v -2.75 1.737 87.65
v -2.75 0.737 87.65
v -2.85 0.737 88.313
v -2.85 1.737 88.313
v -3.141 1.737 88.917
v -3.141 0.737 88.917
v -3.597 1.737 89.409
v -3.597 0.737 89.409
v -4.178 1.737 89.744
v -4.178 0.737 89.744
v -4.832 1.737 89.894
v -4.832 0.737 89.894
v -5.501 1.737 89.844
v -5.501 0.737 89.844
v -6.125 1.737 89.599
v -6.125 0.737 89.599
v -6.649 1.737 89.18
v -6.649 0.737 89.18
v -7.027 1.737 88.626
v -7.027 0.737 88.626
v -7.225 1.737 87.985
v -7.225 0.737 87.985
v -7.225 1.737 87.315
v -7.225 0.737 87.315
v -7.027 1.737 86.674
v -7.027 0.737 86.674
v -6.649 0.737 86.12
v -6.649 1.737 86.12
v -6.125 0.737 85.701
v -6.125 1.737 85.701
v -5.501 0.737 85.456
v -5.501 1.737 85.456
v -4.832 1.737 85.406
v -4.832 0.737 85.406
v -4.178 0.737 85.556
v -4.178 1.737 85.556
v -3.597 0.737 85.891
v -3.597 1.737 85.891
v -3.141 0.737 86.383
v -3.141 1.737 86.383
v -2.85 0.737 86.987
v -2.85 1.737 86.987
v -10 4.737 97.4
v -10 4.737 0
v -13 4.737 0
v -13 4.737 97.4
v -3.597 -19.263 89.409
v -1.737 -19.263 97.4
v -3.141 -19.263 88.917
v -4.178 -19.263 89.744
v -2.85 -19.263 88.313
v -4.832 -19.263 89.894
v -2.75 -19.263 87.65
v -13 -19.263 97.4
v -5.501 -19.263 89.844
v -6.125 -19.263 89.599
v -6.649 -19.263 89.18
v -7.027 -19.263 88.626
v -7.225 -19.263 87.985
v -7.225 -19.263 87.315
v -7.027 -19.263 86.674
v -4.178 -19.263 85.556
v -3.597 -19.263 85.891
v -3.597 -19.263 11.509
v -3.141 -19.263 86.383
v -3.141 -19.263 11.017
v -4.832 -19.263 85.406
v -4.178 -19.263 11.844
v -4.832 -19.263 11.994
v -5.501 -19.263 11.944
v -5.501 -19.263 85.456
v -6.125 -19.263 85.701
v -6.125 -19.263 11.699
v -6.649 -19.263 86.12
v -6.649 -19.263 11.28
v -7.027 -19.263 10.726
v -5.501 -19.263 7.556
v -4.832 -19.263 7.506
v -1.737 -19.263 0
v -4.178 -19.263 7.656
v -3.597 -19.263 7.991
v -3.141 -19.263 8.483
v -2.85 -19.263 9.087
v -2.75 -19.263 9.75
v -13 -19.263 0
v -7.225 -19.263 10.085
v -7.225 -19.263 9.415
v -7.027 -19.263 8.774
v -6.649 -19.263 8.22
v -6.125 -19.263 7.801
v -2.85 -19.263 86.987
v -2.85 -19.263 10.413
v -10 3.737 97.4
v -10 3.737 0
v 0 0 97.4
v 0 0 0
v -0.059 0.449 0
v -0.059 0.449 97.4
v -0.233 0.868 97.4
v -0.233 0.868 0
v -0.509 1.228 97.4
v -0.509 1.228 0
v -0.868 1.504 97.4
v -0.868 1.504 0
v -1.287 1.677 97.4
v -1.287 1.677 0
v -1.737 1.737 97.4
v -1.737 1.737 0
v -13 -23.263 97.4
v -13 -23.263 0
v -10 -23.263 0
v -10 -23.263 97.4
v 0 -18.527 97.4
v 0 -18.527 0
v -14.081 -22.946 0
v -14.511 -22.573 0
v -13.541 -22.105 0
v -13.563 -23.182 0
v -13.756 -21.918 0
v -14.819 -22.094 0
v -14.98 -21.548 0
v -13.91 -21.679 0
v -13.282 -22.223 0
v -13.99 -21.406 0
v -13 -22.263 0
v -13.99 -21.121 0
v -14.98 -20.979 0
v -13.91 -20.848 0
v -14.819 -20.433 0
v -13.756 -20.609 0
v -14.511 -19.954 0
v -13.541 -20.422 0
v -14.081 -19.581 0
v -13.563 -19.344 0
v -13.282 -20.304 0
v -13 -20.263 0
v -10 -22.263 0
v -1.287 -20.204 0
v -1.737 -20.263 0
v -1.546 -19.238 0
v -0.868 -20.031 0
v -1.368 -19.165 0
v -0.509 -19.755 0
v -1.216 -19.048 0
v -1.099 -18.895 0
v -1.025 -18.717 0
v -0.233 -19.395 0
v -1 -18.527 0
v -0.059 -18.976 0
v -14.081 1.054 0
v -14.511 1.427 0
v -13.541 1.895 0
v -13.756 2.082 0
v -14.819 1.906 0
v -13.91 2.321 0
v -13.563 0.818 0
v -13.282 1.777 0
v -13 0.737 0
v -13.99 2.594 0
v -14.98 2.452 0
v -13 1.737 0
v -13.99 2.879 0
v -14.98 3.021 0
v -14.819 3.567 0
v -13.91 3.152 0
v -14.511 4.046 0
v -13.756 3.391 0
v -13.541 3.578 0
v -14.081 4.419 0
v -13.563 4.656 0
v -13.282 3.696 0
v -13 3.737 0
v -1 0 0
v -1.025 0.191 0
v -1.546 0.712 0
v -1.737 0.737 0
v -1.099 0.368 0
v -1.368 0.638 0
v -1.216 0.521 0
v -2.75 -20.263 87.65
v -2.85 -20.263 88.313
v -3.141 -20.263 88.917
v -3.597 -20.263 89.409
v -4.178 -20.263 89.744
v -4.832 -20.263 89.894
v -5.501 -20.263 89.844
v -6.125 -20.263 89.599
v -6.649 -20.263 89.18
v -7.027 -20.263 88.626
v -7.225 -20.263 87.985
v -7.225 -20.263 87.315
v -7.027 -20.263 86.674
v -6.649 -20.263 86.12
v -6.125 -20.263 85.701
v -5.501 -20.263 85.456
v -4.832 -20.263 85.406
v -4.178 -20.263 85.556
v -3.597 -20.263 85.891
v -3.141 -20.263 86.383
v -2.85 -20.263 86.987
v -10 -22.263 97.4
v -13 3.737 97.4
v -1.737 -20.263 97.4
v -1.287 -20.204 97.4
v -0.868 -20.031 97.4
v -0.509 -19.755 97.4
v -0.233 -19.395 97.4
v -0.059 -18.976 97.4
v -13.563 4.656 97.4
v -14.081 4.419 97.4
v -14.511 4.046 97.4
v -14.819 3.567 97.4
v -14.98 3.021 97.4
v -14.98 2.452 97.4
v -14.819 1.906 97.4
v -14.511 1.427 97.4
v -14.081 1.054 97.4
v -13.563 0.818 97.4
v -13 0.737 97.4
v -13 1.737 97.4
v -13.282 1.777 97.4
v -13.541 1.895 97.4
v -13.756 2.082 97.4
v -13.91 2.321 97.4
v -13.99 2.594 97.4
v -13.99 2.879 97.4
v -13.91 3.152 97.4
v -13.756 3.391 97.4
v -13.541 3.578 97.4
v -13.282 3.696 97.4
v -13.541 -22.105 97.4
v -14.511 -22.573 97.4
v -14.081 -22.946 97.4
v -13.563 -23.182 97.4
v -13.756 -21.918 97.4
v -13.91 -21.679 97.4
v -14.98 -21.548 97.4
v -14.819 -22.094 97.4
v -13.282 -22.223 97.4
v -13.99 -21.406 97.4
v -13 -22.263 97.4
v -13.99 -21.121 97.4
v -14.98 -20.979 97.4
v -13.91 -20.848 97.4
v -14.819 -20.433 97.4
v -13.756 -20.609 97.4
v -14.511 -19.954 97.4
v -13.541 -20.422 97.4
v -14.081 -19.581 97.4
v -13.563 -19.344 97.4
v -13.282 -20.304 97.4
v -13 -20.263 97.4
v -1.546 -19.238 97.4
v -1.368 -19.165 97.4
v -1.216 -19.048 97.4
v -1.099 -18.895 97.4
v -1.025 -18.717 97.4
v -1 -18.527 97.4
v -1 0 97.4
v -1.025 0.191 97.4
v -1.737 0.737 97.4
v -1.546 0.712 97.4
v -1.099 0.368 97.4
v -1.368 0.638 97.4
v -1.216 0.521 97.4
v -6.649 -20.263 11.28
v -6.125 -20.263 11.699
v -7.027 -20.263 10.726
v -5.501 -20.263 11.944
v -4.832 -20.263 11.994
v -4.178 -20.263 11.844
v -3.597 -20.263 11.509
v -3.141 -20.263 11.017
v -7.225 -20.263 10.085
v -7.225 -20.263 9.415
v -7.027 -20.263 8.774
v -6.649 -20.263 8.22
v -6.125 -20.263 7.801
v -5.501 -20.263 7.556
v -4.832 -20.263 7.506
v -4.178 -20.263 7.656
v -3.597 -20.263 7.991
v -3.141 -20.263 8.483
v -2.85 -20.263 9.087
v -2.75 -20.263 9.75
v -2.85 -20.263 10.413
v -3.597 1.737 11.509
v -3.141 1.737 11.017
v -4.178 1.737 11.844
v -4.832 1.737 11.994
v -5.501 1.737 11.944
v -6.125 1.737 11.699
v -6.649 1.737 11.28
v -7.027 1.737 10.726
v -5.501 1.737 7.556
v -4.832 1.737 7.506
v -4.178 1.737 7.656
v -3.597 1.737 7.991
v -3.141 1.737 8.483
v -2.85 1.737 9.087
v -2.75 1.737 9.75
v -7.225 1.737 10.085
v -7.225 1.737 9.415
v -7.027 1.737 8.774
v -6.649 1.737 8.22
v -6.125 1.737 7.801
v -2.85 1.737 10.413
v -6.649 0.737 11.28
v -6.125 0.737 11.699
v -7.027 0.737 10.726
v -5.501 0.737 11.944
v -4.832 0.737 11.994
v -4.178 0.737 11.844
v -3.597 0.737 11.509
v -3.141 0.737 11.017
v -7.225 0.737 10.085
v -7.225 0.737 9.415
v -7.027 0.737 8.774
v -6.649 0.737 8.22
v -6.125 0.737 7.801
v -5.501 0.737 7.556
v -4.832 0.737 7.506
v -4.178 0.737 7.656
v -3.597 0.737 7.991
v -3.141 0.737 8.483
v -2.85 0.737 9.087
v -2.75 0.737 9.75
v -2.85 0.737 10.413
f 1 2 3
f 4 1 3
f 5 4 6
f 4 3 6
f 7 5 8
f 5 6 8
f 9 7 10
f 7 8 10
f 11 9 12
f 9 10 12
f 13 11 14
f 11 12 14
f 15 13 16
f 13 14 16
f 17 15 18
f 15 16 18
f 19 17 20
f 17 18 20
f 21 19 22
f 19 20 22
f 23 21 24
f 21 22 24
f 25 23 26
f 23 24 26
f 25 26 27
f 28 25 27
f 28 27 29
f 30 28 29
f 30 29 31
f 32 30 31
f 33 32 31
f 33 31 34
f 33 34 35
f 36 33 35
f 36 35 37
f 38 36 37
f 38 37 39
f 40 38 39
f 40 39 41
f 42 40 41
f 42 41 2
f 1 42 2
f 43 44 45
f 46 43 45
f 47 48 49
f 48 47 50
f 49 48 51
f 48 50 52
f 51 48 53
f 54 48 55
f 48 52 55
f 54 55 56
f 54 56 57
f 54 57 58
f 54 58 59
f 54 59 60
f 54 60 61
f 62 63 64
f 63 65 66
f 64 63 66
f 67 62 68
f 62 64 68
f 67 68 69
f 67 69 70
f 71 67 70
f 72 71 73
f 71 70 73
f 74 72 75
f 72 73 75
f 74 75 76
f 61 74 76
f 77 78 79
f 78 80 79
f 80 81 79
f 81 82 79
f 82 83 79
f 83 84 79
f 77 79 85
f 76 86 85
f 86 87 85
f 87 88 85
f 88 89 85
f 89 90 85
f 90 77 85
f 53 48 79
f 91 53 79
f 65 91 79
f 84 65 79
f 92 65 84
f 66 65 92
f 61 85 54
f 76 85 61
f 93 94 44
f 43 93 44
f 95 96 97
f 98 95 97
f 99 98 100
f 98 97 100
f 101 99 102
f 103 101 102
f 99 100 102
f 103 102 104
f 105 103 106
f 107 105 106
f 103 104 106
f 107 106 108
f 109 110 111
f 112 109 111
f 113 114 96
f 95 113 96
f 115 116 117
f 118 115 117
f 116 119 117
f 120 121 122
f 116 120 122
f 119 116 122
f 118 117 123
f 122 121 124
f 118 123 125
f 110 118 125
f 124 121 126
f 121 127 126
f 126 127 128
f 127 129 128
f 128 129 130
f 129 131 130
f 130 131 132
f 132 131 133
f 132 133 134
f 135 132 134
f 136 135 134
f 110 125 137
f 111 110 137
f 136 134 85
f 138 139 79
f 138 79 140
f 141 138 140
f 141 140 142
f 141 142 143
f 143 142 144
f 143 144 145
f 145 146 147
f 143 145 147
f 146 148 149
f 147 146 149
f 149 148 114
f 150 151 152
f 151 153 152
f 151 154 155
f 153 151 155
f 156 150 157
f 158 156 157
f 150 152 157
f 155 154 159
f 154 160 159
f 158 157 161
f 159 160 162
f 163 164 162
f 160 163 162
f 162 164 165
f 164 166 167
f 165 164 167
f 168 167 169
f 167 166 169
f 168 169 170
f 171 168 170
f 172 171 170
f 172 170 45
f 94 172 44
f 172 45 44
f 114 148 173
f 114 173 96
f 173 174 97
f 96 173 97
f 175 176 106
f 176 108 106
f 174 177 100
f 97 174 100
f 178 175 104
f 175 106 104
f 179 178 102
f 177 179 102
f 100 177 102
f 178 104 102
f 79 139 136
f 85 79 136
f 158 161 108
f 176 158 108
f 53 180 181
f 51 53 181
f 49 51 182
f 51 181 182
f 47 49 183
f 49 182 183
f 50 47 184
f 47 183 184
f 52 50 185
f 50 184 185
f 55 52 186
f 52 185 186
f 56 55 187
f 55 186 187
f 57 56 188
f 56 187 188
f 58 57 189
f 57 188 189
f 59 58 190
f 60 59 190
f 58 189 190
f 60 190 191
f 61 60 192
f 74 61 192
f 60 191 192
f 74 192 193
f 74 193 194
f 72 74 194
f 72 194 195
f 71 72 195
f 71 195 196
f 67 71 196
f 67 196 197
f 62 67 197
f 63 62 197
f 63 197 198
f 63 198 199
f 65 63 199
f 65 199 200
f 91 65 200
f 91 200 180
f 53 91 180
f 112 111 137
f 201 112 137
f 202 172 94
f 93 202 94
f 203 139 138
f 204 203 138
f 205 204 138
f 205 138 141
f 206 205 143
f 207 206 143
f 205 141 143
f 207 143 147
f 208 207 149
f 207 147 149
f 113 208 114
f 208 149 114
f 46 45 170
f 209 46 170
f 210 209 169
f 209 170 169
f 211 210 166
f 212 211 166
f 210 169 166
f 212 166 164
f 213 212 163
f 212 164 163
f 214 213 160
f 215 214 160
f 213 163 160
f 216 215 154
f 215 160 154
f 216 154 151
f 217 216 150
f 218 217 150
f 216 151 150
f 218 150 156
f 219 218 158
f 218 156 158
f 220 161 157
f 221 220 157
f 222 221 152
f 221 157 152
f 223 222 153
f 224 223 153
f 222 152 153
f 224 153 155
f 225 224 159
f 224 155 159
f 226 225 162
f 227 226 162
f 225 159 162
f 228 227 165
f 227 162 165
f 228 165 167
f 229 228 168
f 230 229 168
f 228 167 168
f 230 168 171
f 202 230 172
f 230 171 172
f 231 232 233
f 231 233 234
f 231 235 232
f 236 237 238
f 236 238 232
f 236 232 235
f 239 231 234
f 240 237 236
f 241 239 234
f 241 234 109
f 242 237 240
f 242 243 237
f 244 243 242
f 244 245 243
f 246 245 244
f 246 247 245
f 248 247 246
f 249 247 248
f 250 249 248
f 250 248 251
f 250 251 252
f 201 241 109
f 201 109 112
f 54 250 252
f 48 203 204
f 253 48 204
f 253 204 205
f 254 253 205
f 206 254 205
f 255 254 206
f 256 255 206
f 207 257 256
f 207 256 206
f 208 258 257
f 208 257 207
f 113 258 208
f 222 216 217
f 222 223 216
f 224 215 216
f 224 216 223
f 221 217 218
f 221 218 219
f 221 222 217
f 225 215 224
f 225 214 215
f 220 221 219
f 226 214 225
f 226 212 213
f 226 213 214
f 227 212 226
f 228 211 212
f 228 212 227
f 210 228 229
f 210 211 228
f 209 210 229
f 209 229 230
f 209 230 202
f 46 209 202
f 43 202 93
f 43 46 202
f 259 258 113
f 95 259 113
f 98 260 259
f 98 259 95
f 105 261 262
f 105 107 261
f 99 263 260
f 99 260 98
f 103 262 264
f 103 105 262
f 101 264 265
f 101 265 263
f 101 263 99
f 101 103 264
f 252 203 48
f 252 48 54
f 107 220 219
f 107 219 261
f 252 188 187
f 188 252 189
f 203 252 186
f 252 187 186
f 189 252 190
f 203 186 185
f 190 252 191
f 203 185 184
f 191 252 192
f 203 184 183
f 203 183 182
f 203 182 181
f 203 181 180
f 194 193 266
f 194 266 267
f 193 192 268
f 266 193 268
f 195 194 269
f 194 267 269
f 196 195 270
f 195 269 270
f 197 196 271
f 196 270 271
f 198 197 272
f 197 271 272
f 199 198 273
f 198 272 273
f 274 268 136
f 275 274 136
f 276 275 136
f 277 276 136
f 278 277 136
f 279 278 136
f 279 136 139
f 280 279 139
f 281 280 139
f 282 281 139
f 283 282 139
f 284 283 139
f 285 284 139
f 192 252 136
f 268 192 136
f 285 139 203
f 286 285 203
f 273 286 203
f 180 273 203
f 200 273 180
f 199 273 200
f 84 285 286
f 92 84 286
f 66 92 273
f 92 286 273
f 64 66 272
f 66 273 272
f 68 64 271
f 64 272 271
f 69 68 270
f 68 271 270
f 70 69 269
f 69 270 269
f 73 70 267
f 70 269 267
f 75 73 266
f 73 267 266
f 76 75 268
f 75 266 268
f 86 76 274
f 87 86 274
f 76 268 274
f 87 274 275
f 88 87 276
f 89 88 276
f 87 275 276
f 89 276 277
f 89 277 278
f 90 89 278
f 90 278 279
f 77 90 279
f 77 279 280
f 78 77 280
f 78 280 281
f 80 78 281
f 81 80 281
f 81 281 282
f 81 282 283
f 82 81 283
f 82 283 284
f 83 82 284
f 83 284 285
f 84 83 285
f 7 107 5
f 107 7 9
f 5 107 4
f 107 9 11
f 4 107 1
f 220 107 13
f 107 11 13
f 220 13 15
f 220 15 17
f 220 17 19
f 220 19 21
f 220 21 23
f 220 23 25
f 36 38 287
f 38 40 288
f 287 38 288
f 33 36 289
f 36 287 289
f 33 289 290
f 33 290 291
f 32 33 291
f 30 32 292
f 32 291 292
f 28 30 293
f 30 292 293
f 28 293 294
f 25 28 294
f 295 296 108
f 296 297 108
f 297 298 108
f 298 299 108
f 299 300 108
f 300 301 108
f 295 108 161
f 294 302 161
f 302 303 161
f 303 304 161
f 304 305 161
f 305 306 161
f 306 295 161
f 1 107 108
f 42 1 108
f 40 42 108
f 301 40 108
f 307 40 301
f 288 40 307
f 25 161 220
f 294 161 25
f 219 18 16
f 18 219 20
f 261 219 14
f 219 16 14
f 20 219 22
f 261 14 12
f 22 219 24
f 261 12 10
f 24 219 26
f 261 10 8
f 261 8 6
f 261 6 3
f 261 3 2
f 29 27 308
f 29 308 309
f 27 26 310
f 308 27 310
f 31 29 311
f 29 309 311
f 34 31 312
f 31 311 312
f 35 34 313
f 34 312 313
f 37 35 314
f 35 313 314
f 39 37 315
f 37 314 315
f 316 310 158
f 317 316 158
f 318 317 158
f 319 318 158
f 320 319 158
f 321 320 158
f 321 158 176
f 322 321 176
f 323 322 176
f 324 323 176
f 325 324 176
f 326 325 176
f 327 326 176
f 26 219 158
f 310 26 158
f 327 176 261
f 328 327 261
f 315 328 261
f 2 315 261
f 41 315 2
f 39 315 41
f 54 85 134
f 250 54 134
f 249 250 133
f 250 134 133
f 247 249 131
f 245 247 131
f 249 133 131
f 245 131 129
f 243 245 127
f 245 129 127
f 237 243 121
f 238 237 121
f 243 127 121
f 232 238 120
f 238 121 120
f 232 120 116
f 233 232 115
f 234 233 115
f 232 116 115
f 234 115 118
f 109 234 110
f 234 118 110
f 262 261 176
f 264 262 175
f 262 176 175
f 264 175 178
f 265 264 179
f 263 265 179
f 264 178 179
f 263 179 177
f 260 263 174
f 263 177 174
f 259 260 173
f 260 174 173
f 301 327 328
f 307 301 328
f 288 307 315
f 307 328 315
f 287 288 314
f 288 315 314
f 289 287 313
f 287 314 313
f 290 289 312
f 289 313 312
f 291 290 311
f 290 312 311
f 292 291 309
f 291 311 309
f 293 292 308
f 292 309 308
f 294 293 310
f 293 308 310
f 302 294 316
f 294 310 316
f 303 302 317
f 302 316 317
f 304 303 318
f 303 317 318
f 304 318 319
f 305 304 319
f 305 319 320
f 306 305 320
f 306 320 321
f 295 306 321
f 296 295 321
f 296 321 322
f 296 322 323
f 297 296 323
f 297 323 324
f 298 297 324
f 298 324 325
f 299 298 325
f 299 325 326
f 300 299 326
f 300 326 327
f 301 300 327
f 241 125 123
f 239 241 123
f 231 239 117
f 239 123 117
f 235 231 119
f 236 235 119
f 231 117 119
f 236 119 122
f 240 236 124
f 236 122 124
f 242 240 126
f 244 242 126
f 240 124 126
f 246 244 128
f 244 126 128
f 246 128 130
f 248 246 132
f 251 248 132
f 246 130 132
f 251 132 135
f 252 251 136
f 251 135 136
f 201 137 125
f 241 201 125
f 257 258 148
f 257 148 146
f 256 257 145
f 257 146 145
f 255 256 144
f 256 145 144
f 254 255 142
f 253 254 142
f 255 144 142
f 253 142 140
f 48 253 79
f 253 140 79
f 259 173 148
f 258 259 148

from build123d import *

# Parameters (mm, degrees)
EXTRUDE_1_DEPTH     = 97.4
SKETCH_2_R          = 2.25
CUT_EXTRUDE_1_DEPTH = 97.4


with BuildPart() as part:
    # 草图1 → 凸台-拉伸1 (new body)
    with BuildSketch(Plane.XY):
        with BuildLine():
            Line((-13, 0.7366), (-1.7366, 0.7366))
            ThreePointArc((-1.7366, 0.7366), (-1.215745145, 0.520854855), (-1, 0))
            Line((-1, 0), (-1, -18.5268))
            ThreePointArc((-1, -18.5268), (-1.215745145, -19.047654855), (-1.7366, -19.2634))
            Line((-1.7366, -19.2634), (-13, -19.2634))
            ThreePointArc((-13, -19.2634), (-15, -21.2634), (-13, -23.2634))
            Line((-13, -23.2634), (-10, -23.2634))
            Line((-10, -23.2634), (-10, -22.2634))
            Line((-10, -22.2634), (-13, -22.2634))
            ThreePointArc((-13, -22.2634), (-14, -21.2634), (-13, -20.2634))
            Line((-13, -20.2634), (-1.7366, -20.2634))
            ThreePointArc((-1.7366, -20.2634), (-0.508638364, -19.754761636), (0, -18.5268))
            Line((0, -18.5268), (0, 0))
            ThreePointArc((0, 0), (-0.508638364, 1.227961636), (-1.7366, 1.7366))
            Line((-1.7366, 1.7366), (-13, 1.7366))
            ThreePointArc((-13, 1.7366), (-14, 2.7366), (-13, 3.7366))
            Line((-13, 3.7366), (-10, 3.7366))
            Line((-10, 3.7366), (-10, 4.7366))
            Line((-10, 4.7366), (-13, 4.7366))
            ThreePointArc((-13, 4.7366), (-15, 2.7366), (-13, 0.7366))
        make_face()
    extrude(amount=EXTRUDE_1_DEPTH)

    # 草图2 → 切除-拉伸1 (cut)
    with BuildSketch(Plane.XZ.offset(20.2634)):
        with Locations((-5, 87.65)):
            Circle(SKETCH_2_R)
        with Locations((-5, 9.75)):
            Circle(SKETCH_2_R)
    extrude(amount=-CUT_EXTRUDE_1_DEPTH, mode=Mode.SUBTRACT)


solid = part.part
